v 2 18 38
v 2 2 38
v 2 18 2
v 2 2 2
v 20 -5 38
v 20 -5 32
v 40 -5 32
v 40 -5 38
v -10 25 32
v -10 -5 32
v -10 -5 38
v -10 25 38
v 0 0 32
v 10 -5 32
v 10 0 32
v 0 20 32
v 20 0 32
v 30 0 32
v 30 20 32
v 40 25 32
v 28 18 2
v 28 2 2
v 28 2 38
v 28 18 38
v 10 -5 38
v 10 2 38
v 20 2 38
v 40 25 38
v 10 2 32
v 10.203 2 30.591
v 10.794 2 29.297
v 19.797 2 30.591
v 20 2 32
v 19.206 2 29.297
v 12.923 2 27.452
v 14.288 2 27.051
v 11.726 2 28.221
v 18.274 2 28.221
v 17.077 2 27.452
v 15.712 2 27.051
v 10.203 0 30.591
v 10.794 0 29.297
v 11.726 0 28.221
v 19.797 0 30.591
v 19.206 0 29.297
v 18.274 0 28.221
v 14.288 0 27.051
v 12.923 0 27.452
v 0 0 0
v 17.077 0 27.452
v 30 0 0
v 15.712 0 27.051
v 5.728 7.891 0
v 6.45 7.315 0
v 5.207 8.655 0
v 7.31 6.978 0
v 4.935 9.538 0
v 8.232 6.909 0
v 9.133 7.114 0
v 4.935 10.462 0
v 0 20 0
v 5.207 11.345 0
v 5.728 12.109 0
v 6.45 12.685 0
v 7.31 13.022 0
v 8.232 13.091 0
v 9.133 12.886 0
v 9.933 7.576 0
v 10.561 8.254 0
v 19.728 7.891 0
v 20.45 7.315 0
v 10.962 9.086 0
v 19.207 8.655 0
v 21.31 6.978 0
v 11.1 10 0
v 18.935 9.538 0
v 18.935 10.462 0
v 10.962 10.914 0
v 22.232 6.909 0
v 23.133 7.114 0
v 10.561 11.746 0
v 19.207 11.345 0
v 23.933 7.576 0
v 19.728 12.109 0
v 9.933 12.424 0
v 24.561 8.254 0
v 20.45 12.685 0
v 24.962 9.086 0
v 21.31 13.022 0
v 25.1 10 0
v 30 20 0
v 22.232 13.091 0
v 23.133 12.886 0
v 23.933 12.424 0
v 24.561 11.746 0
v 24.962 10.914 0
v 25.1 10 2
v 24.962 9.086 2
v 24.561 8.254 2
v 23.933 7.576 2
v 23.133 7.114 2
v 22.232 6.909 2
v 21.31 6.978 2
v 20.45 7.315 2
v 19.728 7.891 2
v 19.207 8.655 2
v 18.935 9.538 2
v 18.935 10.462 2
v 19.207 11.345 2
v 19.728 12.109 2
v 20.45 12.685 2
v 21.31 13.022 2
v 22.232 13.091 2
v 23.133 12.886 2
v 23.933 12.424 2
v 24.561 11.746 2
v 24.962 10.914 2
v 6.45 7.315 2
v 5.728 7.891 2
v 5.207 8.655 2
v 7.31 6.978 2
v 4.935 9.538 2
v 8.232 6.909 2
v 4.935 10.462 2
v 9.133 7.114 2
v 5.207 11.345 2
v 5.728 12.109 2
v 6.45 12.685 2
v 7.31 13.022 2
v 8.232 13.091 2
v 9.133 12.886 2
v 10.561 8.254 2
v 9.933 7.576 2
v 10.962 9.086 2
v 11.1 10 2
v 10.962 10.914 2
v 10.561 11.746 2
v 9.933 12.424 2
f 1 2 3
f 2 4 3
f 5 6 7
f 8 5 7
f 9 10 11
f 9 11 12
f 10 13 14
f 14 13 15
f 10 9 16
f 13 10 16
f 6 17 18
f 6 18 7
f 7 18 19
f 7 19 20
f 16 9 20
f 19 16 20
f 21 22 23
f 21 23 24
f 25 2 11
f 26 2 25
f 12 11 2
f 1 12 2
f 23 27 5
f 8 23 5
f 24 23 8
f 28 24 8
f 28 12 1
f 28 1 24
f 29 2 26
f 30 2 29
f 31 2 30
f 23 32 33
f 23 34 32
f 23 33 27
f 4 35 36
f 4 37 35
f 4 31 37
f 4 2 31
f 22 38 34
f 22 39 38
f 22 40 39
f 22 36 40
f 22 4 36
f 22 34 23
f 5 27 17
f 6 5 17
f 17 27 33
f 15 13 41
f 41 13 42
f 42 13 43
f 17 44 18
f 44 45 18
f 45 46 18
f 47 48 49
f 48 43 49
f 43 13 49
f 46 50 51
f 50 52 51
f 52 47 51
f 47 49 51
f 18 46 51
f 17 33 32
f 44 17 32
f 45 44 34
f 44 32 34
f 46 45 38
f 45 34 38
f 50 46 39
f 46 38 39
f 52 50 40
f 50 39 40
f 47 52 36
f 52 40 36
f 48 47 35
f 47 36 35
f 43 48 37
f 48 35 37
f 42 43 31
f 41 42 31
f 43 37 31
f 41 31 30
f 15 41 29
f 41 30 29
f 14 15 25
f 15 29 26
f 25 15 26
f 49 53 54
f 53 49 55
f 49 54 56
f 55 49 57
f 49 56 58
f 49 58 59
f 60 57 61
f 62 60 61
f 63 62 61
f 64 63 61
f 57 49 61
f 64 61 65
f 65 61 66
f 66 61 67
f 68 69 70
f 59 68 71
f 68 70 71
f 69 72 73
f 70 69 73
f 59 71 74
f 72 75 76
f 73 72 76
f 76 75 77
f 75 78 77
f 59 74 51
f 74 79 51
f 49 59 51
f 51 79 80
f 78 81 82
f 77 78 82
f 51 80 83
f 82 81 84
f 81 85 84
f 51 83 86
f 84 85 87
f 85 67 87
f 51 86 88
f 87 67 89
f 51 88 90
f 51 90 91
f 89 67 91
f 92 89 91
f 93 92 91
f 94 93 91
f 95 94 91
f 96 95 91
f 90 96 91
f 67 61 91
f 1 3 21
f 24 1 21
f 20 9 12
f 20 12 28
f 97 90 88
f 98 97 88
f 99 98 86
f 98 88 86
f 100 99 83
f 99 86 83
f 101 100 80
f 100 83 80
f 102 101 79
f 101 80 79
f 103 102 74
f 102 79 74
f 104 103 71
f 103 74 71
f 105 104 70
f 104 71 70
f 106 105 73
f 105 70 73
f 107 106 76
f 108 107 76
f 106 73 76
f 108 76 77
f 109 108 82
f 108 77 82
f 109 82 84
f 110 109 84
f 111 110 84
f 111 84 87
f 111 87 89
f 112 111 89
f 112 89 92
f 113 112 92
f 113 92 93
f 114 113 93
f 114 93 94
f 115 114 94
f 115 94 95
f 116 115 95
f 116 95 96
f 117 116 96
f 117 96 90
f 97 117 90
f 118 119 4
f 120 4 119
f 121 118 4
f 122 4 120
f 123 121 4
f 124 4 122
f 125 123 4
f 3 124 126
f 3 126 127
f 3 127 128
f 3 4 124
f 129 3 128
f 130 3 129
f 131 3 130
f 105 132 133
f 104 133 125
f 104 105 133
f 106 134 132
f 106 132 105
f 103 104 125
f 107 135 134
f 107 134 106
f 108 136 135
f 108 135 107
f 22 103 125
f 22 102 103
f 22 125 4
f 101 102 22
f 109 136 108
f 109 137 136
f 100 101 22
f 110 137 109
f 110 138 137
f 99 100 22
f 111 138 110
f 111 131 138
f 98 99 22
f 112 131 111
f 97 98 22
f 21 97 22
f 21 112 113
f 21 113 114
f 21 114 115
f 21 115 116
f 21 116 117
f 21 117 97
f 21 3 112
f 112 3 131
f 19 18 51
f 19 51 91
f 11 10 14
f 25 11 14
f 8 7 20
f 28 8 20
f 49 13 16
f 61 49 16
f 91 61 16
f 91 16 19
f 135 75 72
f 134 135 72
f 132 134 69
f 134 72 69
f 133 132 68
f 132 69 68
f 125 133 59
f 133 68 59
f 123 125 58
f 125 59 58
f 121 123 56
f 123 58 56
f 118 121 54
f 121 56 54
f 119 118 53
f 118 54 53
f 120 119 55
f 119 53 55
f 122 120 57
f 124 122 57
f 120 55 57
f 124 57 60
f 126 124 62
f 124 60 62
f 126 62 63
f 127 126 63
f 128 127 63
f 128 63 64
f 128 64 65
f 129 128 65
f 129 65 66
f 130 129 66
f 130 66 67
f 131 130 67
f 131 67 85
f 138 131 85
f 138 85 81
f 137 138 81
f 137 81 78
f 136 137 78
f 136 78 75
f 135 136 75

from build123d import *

# Parameters (mm, degrees)
F0_W     = 30
F0_H     = 20
F1_DEPTH = 2
F2_W     = 30
F2_H     = 20
F2_W_2   = 26
F2_H_2   = 16
F3_DEPTH = 30
F4_R     = 3.1
F5_DEPTH = 25
F6_W     = 50
F6_H     = 30
F6_W_2   = 26
F6_H_2   = 16
F7_DEPTH = 6
F9_DEPTH = 25


with BuildPart() as f1:
    # F0 (on Top) → F1 (new body)
    with BuildSketch(Plane.XY):
        with Locations((15, 10)):
            Rectangle(F0_W, F0_H)
    extrude(amount=F1_DEPTH)

    # F2 (on face) → F3 (join)
    with BuildSketch(Plane.XY.offset(2)):
        with Locations((15, 10)):
            Rectangle(F2_W, F2_H)
        with Locations((15, 10)):
            Rectangle(F2_W_2, F2_H_2, mode=Mode.SUBTRACT)
    extrude(amount=F3_DEPTH)

    # F4 (on face) → F5 (cut)
    with BuildSketch(Plane(origin=(0, 0, 0), x_dir=(1, 0, 0), z_dir=(0, 0, -1))):
        with Locations((8, -10)):
            Circle(F4_R)
        with Locations((22, -10)):
            Circle(F4_R)
    extrude(amount=-F5_DEPTH, mode=Mode.SUBTRACT)

    # F6 (on face) → F7 (join)
    with BuildSketch(Plane.XY.offset(32)):
        with Locations((15, 10)):
            Rectangle(F6_W, F6_H)
        with Locations((15, 10)):
            Rectangle(F6_W_2, F6_H_2, mode=Mode.SUBTRACT)
    extrude(amount=F7_DEPTH)

    # F8 (on face) → F9 (cut)
    with BuildSketch(Plane(origin=(0, 2, 0), x_dir=(-1, 0, 0), z_dir=(0, 1, 0))):
        with BuildLine():
            Line((-20, 38), (-20, 32))
            ThreePointArc((-20, 32), (-15, 27), (-10, 32))
            Line((-10, 32), (-10, 38))
            Line((-10, 38), (-20, 38))
        make_face()
    extrude(amount=-F9_DEPTH, mode=Mode.SUBTRACT)


solid = f1.part
